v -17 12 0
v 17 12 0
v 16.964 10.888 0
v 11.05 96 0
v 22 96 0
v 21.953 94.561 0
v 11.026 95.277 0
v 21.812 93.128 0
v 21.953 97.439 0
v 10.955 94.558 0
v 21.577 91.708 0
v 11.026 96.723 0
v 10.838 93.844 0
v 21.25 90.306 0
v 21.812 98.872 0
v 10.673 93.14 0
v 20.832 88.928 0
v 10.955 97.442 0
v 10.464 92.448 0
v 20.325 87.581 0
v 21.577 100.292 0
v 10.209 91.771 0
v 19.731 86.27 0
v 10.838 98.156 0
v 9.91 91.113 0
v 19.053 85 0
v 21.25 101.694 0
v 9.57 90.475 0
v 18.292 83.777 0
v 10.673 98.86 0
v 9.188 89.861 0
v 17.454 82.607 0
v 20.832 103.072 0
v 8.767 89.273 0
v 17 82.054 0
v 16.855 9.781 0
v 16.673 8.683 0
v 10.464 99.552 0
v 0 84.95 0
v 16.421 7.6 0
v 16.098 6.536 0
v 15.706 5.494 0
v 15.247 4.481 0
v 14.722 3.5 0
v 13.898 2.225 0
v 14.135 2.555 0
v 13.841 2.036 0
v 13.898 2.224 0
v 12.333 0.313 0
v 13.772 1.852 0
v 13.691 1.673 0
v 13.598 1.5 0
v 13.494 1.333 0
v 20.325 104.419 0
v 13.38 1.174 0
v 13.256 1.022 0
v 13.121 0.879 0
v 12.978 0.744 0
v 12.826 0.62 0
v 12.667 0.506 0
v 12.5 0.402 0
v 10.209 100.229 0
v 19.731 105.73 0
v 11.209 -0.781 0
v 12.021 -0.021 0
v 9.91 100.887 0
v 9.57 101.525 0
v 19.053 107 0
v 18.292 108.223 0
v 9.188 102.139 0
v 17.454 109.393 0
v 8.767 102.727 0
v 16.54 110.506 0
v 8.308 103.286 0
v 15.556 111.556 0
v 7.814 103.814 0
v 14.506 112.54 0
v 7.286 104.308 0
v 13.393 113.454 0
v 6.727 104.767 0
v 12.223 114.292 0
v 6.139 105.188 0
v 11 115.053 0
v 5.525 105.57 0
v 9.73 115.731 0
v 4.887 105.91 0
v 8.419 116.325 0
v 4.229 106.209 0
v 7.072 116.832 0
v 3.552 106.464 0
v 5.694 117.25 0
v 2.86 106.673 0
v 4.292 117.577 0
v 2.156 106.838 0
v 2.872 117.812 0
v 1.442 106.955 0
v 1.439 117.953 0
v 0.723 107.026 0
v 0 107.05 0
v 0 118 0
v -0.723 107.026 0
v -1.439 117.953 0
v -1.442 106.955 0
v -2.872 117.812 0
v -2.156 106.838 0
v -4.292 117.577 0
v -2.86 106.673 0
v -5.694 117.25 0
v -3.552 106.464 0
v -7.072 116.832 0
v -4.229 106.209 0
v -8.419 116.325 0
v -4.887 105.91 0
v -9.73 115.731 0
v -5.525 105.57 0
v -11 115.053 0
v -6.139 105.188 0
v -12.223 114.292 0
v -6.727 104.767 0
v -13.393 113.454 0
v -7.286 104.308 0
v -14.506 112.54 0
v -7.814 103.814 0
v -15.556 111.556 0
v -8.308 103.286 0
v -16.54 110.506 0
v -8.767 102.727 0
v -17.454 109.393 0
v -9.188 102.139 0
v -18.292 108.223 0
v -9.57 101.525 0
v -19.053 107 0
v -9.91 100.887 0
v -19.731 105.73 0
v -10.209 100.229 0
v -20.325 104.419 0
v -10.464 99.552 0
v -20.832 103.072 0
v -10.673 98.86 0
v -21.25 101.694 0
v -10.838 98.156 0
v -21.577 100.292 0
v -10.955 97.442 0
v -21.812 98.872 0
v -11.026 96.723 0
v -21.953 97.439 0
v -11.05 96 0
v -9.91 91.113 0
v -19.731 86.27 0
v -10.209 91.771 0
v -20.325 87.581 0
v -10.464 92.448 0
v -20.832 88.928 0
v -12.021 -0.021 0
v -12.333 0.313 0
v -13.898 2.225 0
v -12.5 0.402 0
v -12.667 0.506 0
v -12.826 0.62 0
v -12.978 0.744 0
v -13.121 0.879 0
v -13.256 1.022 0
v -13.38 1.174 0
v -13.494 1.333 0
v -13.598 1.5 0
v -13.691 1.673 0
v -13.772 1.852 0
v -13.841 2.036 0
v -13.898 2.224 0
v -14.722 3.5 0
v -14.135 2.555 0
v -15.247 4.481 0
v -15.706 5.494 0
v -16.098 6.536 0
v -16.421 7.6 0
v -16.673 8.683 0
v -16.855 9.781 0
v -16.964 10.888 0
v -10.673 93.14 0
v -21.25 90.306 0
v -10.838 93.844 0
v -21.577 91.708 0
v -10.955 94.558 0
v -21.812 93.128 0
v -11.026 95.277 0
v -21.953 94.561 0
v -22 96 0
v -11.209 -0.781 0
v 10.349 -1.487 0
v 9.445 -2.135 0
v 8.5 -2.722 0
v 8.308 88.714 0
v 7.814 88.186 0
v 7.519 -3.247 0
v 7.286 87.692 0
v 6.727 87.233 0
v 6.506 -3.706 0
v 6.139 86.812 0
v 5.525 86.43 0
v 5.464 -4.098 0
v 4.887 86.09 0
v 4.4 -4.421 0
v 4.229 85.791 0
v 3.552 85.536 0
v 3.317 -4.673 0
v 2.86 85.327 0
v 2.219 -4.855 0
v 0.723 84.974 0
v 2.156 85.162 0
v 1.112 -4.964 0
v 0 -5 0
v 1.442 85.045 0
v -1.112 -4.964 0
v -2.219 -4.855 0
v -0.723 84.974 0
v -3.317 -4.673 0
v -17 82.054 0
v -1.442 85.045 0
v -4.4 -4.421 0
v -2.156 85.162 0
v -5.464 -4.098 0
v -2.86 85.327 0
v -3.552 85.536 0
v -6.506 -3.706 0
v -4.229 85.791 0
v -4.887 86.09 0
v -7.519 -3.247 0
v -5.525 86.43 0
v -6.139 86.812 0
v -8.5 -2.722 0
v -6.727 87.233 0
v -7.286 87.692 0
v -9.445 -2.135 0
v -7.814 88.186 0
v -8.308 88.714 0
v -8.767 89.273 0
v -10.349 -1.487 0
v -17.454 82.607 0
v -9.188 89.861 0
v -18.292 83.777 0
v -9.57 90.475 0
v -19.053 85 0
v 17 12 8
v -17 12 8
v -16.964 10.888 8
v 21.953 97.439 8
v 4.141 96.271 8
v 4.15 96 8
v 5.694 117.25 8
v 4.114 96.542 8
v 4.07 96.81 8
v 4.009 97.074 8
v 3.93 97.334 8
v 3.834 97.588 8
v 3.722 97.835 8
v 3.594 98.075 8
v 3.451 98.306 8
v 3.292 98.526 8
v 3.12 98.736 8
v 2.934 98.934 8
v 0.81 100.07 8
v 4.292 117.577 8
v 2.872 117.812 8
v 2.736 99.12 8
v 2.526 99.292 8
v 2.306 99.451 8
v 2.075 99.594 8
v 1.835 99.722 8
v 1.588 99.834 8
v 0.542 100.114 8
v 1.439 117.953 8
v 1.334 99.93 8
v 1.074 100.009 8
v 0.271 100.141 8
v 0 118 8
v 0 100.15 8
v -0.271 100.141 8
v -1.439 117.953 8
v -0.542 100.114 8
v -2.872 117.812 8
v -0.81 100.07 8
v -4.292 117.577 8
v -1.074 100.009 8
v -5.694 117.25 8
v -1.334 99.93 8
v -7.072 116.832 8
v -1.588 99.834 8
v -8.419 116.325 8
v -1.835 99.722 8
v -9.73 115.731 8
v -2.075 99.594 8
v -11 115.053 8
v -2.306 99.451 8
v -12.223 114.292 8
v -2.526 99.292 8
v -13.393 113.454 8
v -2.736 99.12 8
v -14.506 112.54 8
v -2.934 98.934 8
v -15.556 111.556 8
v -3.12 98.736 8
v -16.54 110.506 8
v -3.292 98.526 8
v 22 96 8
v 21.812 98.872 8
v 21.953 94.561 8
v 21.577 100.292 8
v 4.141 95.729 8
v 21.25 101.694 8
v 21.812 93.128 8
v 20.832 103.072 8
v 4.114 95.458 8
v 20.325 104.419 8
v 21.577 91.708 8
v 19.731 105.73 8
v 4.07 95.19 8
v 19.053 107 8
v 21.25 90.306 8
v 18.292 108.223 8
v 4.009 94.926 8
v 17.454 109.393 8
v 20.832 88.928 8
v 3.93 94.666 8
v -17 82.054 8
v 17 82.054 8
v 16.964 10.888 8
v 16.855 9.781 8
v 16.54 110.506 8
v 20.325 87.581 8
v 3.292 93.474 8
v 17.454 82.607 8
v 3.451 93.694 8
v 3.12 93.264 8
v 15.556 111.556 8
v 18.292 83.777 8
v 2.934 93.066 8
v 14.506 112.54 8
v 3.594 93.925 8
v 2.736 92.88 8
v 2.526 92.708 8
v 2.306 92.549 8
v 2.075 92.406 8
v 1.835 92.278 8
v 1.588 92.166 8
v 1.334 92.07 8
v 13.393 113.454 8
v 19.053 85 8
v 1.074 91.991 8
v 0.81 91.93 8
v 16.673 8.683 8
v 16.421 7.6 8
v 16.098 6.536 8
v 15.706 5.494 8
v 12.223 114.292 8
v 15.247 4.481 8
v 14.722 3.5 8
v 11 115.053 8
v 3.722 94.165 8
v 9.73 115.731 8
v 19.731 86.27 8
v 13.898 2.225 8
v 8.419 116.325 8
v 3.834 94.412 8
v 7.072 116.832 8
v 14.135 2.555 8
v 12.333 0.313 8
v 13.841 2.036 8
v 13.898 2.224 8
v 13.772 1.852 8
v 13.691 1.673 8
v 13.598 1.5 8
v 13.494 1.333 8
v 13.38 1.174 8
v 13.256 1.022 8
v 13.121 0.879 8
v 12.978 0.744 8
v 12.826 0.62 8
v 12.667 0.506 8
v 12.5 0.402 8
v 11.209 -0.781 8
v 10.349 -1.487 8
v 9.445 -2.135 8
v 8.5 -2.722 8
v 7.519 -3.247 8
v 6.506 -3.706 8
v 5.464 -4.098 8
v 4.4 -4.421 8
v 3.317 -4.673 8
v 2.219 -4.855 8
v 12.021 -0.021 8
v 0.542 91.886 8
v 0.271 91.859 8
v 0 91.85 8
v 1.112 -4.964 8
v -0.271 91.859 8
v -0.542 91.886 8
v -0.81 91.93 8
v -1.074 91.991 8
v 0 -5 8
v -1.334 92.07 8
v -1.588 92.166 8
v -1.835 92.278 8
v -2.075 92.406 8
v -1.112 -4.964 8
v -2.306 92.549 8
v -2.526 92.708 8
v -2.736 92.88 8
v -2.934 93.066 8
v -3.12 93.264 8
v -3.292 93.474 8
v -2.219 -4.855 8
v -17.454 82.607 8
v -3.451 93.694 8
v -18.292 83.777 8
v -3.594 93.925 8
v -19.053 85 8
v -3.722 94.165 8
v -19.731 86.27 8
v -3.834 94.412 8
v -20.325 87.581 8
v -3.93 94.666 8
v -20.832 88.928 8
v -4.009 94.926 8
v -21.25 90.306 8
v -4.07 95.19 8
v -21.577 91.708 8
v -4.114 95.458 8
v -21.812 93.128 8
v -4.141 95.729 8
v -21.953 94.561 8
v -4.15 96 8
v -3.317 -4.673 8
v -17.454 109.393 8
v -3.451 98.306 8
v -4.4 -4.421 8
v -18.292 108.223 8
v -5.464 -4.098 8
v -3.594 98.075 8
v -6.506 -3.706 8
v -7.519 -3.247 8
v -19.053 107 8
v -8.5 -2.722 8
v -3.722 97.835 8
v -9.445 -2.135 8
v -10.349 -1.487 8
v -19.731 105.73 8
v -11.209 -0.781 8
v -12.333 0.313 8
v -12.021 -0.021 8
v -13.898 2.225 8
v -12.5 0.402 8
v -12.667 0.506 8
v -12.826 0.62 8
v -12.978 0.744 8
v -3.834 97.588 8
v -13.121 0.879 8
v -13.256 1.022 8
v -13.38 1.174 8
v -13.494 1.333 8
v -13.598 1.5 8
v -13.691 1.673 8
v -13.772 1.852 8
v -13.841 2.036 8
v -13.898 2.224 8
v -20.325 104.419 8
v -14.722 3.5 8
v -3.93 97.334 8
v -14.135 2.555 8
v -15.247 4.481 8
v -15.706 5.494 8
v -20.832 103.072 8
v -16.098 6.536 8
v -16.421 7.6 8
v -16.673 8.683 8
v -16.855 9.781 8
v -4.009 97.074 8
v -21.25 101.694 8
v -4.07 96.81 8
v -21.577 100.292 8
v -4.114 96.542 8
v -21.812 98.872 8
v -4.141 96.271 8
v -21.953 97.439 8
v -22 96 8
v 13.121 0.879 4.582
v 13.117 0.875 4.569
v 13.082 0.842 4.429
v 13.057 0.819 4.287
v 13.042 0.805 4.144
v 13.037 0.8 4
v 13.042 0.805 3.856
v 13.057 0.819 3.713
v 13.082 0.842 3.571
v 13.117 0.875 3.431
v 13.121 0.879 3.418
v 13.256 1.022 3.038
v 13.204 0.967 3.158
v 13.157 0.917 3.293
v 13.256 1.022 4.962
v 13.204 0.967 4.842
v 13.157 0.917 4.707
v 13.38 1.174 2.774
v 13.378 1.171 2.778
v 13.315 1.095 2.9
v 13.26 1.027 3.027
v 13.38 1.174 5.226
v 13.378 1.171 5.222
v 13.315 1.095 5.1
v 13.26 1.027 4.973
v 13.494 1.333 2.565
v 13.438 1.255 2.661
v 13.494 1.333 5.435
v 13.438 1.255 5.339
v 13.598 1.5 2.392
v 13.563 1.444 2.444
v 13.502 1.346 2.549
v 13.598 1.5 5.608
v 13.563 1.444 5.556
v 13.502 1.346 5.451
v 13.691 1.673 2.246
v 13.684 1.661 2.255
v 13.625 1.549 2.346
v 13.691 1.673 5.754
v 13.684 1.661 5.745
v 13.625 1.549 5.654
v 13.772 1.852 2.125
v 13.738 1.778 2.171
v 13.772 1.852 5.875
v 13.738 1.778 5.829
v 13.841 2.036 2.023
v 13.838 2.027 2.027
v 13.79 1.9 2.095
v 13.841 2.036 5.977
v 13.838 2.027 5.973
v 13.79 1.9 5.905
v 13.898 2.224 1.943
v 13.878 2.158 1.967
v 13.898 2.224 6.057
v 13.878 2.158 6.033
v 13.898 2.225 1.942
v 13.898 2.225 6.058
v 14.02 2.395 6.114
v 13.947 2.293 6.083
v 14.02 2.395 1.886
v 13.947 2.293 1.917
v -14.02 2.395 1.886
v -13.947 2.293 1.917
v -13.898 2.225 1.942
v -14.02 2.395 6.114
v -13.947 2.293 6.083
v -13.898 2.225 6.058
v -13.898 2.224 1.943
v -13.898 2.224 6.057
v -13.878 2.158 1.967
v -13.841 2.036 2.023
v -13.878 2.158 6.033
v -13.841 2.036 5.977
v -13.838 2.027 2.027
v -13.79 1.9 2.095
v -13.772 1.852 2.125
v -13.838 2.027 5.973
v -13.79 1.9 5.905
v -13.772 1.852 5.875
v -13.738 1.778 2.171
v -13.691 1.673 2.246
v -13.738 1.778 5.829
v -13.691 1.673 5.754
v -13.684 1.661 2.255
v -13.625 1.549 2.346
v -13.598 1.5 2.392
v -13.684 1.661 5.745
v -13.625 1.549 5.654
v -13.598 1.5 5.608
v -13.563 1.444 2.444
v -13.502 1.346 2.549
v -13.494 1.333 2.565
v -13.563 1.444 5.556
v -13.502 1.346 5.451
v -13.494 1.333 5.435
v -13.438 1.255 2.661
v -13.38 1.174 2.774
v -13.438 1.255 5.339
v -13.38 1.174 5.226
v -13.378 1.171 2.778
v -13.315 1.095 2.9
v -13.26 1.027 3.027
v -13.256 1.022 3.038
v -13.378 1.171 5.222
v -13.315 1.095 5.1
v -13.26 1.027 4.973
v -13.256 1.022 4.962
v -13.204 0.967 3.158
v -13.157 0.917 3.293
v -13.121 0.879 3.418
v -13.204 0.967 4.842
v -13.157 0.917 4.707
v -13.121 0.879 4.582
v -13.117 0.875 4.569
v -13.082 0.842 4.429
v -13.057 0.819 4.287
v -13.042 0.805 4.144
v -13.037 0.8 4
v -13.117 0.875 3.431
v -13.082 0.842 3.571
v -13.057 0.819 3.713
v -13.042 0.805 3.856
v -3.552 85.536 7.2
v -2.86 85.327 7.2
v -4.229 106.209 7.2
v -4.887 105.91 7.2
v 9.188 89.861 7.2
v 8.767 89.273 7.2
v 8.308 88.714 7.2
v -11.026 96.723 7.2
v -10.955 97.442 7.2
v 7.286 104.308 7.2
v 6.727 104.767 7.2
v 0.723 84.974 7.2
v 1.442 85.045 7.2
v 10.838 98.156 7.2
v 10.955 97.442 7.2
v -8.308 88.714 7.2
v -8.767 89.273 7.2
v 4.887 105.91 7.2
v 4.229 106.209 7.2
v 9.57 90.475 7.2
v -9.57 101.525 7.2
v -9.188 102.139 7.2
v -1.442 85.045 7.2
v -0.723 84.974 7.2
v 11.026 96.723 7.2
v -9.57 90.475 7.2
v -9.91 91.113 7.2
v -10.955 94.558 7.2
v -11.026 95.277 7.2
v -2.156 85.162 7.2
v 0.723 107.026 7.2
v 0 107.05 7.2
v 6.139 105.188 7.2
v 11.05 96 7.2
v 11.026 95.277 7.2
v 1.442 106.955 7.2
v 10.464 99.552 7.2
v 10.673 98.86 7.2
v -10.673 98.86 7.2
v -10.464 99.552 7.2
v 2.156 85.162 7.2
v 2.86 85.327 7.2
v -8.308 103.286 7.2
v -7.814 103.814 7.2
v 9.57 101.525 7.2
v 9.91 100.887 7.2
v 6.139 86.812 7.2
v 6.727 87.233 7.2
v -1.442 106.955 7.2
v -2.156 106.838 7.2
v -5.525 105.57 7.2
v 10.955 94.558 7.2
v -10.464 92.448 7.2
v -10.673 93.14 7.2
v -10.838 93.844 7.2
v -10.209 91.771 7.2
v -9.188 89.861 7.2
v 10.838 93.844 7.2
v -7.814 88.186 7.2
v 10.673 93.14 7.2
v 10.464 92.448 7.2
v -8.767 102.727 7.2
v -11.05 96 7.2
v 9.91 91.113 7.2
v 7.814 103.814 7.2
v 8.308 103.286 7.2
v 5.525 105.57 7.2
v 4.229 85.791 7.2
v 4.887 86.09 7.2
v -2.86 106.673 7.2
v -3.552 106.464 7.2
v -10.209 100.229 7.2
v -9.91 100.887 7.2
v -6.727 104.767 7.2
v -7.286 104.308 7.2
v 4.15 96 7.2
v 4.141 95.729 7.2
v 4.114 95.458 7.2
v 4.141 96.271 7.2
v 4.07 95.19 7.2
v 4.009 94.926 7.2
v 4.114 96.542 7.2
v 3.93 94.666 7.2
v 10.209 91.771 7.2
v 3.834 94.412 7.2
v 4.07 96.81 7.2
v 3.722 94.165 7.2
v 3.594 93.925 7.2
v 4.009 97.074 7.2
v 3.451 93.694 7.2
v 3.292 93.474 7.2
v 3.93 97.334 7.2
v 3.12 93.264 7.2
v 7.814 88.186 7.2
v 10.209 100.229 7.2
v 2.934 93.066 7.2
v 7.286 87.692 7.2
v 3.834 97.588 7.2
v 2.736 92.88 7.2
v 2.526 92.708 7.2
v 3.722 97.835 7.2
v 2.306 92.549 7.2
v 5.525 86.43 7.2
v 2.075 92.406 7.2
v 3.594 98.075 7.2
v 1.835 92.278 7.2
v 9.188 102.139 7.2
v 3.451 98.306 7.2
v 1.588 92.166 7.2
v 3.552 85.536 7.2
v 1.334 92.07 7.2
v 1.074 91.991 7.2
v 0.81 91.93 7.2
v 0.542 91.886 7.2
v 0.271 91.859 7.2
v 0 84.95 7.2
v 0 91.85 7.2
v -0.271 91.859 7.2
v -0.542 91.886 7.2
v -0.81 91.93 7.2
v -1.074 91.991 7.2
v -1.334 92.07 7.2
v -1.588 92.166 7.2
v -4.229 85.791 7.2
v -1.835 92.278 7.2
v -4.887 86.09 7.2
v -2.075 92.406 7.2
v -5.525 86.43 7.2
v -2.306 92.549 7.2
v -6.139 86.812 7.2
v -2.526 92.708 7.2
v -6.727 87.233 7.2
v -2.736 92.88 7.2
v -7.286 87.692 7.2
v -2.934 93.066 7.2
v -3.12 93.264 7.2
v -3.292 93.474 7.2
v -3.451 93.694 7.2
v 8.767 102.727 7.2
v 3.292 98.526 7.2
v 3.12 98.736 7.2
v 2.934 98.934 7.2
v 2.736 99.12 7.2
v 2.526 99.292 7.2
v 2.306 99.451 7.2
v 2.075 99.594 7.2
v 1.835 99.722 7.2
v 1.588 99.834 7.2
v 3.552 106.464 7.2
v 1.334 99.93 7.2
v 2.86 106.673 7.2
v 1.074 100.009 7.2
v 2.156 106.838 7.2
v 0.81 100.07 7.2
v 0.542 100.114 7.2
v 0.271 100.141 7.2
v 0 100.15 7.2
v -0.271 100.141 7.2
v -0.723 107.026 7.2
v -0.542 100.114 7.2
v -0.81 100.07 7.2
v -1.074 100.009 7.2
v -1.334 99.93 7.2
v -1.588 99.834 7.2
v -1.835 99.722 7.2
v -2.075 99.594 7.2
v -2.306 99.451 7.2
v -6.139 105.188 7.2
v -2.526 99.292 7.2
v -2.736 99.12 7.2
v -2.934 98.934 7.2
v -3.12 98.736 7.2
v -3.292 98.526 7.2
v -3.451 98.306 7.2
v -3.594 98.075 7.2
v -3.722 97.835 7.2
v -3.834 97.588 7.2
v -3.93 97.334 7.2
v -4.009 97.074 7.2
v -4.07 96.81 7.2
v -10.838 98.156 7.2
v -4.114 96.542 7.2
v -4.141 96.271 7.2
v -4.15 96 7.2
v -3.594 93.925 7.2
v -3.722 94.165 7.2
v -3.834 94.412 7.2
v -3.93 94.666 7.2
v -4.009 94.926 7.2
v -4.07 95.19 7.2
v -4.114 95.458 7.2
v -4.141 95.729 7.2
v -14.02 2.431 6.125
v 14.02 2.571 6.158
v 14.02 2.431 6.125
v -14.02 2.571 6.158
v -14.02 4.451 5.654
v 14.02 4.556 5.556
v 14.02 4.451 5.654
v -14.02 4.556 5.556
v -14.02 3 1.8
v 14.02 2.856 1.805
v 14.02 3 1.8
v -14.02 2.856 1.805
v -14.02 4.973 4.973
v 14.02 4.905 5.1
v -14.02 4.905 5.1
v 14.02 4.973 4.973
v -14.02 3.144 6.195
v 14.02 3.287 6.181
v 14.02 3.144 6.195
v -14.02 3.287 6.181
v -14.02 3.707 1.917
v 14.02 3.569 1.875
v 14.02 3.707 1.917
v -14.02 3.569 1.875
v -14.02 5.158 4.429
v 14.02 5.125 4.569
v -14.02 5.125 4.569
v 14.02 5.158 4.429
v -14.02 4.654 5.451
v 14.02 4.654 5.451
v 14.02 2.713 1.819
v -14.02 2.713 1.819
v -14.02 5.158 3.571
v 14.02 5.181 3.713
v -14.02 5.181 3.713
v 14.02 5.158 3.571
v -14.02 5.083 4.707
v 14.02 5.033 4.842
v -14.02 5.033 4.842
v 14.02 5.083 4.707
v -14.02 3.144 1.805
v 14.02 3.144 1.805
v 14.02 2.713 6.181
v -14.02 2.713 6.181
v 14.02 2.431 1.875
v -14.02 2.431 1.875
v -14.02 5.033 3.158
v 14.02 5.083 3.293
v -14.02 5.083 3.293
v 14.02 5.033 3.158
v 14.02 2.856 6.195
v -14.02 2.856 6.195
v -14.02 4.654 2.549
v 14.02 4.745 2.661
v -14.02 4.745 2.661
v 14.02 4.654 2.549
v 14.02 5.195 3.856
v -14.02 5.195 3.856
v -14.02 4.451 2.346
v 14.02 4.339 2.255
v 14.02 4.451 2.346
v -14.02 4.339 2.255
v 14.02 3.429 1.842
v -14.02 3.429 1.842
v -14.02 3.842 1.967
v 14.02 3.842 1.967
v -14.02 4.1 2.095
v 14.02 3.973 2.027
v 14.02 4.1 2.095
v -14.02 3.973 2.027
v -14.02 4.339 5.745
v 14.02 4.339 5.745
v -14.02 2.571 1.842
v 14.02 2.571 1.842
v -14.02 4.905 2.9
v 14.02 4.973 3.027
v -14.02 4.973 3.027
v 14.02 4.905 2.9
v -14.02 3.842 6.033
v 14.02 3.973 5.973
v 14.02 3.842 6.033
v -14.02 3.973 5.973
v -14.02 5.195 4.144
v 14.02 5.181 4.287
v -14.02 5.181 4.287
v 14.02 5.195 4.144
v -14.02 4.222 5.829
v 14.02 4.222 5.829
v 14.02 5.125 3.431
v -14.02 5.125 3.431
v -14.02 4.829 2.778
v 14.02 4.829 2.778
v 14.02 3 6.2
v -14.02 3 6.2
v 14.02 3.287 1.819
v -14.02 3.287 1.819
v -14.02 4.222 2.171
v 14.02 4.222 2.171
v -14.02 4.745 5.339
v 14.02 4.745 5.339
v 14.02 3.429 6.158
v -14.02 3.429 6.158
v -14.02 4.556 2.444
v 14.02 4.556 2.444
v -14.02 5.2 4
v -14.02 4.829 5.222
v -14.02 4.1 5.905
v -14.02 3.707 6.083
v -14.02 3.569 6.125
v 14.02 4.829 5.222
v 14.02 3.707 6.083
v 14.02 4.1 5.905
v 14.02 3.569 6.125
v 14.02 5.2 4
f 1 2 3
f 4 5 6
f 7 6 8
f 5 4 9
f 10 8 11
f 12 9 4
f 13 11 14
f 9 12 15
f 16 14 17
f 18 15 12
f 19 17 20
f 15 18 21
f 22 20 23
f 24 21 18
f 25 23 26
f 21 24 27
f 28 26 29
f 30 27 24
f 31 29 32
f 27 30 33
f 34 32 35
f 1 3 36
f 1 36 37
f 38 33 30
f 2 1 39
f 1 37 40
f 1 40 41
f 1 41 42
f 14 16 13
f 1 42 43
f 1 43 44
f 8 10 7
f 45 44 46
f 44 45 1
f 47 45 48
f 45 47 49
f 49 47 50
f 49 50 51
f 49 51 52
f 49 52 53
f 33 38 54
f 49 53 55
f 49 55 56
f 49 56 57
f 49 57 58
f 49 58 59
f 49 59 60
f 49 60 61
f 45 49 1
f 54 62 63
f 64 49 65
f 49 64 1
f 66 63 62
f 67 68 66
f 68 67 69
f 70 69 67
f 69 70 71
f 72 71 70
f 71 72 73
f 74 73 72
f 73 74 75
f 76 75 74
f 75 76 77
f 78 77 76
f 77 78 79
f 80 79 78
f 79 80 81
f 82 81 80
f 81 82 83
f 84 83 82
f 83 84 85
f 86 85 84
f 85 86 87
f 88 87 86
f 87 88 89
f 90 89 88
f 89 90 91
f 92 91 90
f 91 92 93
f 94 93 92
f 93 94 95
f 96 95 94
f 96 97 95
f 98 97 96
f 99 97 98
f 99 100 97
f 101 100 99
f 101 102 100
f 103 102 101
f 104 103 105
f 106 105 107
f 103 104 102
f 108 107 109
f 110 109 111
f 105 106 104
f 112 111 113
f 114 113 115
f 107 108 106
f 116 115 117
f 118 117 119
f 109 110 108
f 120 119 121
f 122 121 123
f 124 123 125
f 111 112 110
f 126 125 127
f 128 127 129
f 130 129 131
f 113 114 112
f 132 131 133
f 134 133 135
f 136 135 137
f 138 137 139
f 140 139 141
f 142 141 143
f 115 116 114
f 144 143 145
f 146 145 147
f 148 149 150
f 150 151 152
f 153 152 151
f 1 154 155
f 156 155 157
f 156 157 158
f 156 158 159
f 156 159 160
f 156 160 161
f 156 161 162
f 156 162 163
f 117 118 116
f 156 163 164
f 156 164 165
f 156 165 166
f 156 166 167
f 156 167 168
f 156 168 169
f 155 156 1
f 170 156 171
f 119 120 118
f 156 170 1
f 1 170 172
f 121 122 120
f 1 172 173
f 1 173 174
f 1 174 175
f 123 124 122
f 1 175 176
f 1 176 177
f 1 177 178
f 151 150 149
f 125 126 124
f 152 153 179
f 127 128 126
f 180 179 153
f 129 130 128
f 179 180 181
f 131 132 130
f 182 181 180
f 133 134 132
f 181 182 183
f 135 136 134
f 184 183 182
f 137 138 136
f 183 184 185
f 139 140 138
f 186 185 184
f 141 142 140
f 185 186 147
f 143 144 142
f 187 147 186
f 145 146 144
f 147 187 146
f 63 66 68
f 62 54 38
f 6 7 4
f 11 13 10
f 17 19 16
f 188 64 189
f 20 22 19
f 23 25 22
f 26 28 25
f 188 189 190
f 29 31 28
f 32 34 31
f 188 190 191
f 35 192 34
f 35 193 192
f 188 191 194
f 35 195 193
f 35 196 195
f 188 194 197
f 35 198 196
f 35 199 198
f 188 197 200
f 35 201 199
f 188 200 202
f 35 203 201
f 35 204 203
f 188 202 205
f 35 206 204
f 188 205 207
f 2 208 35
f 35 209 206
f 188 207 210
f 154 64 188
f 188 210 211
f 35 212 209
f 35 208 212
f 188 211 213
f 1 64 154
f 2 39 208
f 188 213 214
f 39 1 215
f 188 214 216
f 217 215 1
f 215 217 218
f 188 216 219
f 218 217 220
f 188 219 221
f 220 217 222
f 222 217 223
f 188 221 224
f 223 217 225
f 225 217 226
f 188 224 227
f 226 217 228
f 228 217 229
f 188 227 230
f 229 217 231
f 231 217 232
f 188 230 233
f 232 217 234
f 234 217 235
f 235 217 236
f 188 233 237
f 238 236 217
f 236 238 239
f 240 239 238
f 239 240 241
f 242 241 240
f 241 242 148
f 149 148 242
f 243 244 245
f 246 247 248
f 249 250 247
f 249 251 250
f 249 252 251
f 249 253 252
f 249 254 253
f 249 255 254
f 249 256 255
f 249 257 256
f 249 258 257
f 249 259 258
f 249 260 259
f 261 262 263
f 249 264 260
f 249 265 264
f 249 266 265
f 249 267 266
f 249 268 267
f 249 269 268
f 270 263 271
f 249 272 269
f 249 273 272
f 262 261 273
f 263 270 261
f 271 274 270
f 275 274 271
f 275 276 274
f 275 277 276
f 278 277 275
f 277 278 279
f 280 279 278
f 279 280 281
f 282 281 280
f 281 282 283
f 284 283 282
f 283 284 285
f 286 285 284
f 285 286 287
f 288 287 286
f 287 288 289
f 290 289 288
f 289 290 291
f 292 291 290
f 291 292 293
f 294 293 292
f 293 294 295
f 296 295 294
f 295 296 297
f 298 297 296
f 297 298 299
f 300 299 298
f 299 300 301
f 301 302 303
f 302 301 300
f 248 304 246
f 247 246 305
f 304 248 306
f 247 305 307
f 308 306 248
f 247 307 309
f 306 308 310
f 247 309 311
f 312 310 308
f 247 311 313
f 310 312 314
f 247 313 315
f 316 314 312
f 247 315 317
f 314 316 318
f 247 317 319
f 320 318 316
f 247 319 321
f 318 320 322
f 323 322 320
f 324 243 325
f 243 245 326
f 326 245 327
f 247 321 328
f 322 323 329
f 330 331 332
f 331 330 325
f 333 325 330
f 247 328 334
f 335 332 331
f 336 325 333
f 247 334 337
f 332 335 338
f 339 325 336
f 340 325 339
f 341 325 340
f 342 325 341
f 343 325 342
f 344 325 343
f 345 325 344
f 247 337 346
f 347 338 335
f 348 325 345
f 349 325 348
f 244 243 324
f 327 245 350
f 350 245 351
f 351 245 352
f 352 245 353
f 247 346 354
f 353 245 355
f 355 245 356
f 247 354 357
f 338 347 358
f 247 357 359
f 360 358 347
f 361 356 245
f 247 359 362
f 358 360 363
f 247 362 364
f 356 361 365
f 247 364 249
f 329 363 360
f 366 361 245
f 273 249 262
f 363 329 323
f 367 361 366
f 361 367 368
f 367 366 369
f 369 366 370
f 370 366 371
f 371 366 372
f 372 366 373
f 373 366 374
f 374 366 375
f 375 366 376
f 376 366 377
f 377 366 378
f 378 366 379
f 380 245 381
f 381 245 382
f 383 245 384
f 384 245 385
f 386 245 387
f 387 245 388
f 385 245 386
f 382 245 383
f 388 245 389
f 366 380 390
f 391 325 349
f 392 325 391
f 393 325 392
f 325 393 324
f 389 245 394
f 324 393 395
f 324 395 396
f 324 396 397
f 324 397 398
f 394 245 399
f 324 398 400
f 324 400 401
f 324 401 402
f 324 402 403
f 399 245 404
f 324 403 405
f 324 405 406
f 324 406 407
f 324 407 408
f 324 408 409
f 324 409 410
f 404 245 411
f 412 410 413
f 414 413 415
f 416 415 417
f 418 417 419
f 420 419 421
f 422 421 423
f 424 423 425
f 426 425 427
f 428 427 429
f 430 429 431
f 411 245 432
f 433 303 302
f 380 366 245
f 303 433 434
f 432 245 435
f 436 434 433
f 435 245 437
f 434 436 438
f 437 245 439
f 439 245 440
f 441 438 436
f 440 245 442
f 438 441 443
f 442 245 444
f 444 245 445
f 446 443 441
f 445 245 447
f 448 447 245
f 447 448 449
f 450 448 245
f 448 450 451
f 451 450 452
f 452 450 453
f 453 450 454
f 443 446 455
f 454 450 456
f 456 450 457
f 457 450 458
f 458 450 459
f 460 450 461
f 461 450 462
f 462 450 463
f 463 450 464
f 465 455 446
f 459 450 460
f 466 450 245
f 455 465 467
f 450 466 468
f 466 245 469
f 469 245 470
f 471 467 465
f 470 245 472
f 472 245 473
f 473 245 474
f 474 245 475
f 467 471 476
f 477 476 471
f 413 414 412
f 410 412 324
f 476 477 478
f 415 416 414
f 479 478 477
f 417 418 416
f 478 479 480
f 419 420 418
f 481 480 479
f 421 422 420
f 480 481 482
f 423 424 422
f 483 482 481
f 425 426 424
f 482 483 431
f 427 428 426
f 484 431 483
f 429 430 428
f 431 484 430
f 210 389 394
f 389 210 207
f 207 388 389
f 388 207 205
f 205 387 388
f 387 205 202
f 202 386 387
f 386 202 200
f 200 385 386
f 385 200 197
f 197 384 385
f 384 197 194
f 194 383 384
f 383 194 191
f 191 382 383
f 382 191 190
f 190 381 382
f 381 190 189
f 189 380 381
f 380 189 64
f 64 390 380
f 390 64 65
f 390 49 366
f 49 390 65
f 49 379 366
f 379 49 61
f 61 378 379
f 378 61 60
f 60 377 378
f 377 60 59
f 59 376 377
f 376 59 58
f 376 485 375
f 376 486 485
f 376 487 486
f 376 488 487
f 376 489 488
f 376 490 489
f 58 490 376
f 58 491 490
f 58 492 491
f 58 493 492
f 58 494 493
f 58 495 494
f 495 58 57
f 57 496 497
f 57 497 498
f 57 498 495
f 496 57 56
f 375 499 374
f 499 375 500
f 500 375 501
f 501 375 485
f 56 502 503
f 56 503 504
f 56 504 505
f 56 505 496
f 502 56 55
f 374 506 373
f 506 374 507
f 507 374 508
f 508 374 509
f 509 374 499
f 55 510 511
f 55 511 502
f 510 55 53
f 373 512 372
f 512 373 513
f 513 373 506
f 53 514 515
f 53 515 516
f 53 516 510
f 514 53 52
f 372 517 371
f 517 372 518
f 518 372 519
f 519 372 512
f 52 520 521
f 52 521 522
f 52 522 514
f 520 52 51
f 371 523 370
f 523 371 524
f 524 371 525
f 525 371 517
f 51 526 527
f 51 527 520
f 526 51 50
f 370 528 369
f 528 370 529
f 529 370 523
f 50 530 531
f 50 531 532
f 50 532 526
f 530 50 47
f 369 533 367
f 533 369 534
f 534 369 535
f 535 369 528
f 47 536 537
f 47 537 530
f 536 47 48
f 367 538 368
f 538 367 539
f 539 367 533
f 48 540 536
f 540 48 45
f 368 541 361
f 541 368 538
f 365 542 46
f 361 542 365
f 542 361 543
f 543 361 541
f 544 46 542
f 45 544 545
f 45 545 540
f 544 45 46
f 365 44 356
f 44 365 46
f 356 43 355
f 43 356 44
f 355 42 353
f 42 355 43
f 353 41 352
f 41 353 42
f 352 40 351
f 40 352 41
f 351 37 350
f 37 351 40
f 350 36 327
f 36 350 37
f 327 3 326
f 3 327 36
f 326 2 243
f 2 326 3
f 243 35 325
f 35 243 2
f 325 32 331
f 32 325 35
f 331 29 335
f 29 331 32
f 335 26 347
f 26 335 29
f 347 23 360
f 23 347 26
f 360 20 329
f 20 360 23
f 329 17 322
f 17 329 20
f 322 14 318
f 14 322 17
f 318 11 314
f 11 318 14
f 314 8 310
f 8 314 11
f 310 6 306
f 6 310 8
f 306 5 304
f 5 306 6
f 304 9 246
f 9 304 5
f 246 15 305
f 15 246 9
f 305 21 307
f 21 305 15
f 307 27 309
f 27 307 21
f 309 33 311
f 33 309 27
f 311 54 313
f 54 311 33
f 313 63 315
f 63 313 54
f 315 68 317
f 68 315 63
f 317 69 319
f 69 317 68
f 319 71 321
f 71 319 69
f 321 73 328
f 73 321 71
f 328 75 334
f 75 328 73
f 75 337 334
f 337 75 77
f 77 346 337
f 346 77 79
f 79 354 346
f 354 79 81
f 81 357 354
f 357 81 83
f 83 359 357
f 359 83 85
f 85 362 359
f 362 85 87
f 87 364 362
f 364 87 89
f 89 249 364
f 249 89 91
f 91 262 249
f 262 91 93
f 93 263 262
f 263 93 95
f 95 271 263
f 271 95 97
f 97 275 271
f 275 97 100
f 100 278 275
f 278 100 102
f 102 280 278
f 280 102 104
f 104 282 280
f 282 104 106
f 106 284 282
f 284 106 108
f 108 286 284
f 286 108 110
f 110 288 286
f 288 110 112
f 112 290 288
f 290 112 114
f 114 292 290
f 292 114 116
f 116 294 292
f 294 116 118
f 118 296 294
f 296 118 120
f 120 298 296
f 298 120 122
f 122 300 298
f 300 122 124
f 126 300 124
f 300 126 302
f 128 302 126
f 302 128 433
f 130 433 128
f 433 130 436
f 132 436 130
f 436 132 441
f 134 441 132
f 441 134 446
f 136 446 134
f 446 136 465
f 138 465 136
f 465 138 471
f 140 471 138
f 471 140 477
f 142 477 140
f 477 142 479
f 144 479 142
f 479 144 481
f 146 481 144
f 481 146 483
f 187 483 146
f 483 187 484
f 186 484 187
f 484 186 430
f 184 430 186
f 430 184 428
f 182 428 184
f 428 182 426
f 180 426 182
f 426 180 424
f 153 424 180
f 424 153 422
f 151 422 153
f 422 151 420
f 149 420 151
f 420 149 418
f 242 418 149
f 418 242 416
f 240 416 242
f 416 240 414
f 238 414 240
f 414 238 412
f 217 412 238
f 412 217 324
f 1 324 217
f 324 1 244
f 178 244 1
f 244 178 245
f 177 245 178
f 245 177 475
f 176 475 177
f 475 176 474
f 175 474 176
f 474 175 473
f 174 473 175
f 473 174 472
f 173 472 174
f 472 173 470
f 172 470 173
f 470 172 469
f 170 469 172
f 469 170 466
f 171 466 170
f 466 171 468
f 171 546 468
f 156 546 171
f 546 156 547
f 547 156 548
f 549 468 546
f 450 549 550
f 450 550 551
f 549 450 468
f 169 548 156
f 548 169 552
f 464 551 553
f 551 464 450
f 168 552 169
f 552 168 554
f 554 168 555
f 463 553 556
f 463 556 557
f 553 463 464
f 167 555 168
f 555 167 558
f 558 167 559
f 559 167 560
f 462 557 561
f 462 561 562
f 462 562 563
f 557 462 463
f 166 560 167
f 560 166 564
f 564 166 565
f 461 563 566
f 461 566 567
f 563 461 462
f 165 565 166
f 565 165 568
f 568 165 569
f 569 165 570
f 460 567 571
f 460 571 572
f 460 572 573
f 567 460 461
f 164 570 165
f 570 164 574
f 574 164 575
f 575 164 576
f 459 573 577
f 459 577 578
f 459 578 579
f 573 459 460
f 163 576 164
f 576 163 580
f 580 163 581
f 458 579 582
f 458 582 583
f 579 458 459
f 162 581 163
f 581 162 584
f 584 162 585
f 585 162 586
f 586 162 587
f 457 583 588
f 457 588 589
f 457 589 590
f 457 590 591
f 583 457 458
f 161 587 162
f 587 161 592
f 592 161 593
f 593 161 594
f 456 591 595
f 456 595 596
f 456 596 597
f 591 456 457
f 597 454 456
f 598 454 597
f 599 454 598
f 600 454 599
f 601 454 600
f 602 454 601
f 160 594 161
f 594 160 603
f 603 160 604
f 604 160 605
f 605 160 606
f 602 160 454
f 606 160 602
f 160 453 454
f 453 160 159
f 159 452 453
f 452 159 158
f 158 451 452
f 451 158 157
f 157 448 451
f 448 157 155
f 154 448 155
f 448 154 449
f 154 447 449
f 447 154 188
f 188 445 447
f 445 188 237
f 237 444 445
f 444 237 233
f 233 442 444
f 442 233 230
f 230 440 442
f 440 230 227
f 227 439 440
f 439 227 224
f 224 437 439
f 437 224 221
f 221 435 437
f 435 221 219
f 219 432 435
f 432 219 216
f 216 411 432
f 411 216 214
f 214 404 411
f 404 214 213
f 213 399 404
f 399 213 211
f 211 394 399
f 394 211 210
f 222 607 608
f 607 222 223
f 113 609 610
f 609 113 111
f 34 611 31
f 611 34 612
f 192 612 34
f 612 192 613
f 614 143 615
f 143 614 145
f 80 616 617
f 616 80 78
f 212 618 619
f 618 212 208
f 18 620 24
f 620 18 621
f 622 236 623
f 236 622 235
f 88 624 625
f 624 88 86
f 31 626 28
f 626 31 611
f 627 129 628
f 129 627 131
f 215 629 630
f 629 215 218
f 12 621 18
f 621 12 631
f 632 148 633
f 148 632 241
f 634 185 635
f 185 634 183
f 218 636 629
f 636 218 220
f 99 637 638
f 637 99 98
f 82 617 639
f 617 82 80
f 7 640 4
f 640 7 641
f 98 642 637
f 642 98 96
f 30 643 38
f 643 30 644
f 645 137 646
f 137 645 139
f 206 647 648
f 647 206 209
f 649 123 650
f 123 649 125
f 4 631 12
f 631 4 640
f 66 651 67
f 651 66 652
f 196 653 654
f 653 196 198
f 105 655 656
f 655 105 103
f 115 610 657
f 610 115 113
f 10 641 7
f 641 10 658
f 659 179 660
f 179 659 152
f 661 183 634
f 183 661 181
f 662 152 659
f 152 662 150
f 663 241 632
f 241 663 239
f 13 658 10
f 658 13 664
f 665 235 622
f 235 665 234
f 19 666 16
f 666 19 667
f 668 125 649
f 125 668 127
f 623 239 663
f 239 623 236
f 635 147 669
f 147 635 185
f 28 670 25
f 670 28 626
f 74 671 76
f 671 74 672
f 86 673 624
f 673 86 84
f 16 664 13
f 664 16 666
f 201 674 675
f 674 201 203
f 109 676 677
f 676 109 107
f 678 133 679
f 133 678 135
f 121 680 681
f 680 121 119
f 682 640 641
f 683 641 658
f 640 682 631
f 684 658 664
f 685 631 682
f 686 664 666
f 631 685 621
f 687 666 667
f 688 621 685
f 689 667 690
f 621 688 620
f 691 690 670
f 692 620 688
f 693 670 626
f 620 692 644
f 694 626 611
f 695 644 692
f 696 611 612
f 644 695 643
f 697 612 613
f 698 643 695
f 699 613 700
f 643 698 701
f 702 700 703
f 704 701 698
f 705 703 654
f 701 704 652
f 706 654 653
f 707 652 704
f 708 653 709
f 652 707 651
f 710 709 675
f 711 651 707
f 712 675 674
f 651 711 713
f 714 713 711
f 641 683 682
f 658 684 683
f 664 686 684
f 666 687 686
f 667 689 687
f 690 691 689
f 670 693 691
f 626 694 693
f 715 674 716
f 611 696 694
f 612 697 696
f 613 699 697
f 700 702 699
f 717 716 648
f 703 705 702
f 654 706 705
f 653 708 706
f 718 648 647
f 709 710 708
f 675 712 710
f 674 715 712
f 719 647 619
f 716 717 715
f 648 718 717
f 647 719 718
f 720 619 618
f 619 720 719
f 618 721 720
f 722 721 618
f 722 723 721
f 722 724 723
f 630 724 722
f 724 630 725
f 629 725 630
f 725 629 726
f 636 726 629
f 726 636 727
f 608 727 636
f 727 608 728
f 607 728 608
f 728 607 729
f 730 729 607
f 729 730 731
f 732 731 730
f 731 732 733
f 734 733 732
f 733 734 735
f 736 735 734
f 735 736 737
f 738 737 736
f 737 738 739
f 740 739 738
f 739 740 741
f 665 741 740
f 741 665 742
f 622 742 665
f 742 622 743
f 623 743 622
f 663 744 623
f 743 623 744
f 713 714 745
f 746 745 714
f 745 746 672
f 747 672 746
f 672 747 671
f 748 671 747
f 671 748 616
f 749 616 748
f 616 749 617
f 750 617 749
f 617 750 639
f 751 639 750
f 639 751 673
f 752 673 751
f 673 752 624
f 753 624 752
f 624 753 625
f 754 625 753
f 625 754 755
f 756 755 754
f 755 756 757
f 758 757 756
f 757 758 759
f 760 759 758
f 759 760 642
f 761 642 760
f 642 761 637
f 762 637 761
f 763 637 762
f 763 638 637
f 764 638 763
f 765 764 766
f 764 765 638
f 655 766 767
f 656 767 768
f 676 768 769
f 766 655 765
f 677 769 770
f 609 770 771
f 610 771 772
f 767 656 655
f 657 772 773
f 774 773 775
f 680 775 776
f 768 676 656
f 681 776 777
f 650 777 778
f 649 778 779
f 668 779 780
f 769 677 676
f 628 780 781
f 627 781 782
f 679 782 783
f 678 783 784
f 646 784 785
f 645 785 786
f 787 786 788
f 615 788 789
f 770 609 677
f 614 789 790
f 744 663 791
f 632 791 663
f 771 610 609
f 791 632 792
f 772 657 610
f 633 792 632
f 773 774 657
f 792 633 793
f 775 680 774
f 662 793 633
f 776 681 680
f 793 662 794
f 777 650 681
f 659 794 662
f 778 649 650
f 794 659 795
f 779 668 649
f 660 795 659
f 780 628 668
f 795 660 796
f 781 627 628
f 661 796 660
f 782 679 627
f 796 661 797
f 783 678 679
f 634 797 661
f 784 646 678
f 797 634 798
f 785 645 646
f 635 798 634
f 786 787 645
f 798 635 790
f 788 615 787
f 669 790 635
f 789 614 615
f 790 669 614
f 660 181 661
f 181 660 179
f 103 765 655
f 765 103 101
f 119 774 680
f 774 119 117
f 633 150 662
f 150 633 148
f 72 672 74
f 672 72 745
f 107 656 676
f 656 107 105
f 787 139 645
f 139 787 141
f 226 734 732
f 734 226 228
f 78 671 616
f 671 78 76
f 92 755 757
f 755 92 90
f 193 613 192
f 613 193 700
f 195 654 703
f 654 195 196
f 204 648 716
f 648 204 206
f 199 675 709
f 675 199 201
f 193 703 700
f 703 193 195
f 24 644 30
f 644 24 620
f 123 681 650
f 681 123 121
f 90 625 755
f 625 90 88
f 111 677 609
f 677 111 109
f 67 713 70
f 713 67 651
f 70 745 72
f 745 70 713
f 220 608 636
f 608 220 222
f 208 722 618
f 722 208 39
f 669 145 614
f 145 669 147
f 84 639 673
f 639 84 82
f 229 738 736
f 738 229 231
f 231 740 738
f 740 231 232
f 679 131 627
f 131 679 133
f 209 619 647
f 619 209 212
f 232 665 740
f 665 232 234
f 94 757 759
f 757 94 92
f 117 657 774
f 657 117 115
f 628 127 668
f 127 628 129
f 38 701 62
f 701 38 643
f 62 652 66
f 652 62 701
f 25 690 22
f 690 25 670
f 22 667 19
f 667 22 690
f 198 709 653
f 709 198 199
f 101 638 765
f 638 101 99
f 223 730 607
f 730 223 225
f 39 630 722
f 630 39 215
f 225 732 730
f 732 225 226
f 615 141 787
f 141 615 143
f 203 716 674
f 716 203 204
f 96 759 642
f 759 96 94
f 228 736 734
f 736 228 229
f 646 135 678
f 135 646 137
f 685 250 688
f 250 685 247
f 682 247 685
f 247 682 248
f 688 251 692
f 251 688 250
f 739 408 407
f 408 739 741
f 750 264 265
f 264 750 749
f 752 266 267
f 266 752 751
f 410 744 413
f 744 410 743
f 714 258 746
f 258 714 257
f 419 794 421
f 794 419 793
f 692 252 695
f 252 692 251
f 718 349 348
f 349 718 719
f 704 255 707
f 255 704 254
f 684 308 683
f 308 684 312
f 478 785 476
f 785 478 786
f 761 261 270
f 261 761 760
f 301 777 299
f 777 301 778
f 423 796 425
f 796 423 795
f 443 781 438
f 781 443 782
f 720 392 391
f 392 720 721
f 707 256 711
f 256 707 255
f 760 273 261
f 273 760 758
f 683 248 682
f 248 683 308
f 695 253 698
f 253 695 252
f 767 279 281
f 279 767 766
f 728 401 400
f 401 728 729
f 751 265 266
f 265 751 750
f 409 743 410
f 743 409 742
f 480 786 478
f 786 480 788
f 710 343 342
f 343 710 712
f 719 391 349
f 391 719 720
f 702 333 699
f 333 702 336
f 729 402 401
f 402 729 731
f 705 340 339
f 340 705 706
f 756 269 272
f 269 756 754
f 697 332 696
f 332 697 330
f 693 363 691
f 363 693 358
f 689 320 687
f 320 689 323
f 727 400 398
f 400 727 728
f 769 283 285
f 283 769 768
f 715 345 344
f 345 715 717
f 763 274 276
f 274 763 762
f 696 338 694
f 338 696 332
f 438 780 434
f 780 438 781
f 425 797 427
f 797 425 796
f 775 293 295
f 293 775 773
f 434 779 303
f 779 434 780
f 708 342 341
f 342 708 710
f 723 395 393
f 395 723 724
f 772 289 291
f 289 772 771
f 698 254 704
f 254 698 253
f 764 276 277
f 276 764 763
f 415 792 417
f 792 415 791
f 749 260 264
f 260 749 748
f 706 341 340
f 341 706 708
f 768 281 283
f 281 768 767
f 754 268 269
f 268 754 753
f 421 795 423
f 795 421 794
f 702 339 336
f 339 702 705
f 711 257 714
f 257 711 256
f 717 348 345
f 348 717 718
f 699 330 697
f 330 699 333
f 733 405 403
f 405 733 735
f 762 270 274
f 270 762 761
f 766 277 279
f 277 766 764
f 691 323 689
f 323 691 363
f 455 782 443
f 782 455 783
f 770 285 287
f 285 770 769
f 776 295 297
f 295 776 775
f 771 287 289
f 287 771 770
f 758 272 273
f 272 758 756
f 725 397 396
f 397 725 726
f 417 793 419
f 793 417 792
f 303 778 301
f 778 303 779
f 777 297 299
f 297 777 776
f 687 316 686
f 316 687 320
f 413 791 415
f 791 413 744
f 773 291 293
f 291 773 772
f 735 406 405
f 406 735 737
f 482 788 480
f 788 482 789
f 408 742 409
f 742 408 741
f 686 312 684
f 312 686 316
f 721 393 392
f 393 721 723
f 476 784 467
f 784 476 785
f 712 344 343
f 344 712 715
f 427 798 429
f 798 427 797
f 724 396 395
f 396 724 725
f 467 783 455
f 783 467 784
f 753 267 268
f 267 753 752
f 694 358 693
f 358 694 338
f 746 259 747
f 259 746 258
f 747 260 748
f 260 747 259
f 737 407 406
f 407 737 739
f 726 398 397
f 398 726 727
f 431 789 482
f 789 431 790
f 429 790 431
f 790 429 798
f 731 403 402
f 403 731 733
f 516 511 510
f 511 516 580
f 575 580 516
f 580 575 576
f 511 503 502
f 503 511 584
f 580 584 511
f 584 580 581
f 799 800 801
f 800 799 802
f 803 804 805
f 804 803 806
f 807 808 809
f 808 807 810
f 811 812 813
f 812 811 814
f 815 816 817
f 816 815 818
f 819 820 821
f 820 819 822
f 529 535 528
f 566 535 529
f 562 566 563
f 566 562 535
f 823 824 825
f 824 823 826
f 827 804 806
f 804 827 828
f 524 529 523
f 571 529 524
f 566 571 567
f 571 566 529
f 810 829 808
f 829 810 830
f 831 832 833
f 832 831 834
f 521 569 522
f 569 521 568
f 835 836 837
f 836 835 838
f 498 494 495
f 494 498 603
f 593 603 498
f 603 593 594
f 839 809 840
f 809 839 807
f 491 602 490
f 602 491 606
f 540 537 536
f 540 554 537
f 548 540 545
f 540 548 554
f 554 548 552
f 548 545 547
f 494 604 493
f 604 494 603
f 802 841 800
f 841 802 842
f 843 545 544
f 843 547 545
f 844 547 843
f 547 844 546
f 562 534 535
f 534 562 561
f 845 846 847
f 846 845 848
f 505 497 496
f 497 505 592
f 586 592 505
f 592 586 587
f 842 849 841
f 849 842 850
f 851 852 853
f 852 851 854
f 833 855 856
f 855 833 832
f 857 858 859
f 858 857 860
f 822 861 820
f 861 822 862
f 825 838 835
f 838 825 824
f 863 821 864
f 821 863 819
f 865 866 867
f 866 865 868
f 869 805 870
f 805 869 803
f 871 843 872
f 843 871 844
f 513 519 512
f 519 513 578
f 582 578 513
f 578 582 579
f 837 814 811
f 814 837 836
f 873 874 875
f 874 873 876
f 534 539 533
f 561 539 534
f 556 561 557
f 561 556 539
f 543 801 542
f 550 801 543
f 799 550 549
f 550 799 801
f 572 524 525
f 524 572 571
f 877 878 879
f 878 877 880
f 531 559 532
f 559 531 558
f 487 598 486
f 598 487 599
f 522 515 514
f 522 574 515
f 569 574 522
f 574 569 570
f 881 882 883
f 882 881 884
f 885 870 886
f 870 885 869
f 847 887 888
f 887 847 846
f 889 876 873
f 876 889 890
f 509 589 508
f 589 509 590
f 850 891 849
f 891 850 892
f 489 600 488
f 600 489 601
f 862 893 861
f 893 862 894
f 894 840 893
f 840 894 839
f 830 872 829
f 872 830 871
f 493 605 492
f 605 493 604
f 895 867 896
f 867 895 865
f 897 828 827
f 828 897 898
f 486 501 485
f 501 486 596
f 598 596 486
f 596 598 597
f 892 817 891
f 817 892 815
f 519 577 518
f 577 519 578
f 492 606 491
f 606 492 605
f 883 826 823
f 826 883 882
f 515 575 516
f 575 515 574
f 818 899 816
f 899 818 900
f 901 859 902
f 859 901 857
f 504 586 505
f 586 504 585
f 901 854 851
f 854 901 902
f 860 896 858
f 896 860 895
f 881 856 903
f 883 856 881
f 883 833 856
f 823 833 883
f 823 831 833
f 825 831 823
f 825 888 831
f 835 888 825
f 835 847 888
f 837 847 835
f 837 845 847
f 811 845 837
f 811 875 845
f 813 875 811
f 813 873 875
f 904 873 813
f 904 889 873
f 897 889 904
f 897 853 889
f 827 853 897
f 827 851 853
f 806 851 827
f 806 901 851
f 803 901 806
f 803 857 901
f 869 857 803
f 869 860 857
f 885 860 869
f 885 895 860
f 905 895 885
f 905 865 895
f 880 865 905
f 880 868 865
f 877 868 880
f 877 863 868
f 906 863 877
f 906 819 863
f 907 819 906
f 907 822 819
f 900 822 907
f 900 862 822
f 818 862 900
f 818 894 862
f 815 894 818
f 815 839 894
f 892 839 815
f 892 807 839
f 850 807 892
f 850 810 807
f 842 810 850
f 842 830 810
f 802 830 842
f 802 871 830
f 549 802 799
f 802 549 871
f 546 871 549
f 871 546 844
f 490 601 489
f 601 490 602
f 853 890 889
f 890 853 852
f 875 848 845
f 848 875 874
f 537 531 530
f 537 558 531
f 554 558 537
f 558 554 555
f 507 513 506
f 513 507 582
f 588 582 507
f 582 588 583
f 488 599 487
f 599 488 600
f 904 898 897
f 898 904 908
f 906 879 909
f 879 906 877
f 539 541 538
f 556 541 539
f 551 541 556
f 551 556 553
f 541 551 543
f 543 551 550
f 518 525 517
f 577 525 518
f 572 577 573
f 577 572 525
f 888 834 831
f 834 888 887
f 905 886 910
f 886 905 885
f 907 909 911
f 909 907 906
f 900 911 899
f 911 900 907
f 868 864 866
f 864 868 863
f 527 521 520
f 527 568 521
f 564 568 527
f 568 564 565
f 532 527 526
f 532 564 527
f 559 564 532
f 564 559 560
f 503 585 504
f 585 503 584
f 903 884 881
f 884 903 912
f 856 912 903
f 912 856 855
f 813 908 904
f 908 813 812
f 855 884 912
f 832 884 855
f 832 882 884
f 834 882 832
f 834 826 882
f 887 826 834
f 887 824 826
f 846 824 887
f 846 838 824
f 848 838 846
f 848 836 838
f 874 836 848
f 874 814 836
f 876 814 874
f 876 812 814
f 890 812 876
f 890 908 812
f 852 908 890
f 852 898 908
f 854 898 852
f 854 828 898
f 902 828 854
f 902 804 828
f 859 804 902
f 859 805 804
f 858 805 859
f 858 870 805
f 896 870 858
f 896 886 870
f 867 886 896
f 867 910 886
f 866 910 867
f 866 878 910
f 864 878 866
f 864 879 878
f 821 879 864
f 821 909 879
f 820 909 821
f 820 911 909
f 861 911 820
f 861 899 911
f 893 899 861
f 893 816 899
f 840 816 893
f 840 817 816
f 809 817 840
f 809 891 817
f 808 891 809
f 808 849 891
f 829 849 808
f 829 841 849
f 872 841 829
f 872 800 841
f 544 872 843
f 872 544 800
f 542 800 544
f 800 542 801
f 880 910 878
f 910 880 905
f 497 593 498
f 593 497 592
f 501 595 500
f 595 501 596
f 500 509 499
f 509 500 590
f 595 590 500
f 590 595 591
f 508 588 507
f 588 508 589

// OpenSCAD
// file: ../lib/util.scad
include <../config.scad>

function v2_add(a, b) = [a[0] + b[0], a[1] + b[1]];
function v2_sub(a, b) = [a[0] - b[0], a[1] - b[1]];
function v2_scale(a, s) = [a[0] * s, a[1] * s];
function rot2(p, a) = [p[0] * cos(a) - p[1] * sin(a), p[0] * sin(a) + p[1] * cos(a)];
function polar(r, a) = [r * cos(a), r * sin(a)];
function clamp(x, lo, hi) = min(max(x, lo), hi);

module rounded_rect_2d(size = [10, 10], r = 2, center = true) {
    sx = size[0]; sy = size[1]; rr = min(r, min(sx, sy) / 2);
    translate(center ? [0, 0] : [sx / 2, sy / 2])
        offset(r = rr) square([sx - 2 * rr, sy - 2 * rr], center = true);
}

module rounded_plate(size = [10, 10], r = 2, h = 2, center = false) {
    linear_extrude(height = h, center = center)
        rounded_rect_2d(size = size, r = r, center = true);
}

module slot_2d(length = 20, d = 4) {
    hull() {
        translate([-(length - d) / 2, 0]) circle(d = d);
        translate([(length - d) / 2, 0]) circle(d = d);
    }
}

module slot_3d(length = 20, d = 4, h = 5, center = false) {
    linear_extrude(height = h, center = center) slot_2d(length = length, d = d);
}

module hex_prism(af = 10, h = 5, center = false, rotation = 30) {
    rotate([0, 0, rotation]) cylinder(r = af / sqrt(3), h = h, center = center, $fn = 6);
}

module four_at_radius(r = 10, phase = 45) {
    for (a = [phase : 90 : phase + 270])
        rotate([0, 0, a]) translate([r, 0]) children();
}
// file: ../config.scad
// Global configuration for the printable 28BYJ-48 Alt-Az mount.
// Units: millimetres, degrees.

$fn = $preview ? 48 : 96;
EPS = 0.02;

FIT = 0.25;
PRESS_FIT = 0.10;
ELEPHANT_FOOT = 0.25;
MIN_WALL = 2.4;

// 28BYJ-48 mechanical envelope. Clone dimensions vary: verify yours.
BYJ_BODY_D = 28.0;
BYJ_BODY_H = 19.0;
BYJ_FLANGE_T = 1.5;
BYJ_BOSS_D = 9.0;
BYJ_BOSS_H = 2.5;
BYJ_SHAFT_D = 5.0;
BYJ_SHAFT_FLAT = 3.0;
BYJ_SHAFT_L = 10.0;
BYJ_MOUNT_SPACING = 35.0;
BYJ_MOUNT_HOLE_D = 4.0;
BYJ_SHAFT_TO_HOLE_LINE = 8.0;
BYJ_BODY_CENTER_FROM_SHAFT = [0, -11.0];
BYJ_CABLE_BOX = [14.6, 8.0, 11.0];

// Additional reducer: 12 -> 48 and 12 -> 60 = 20:1.
GEAR_MODULE = 1.0;
GEAR_PRESSURE_ANGLE = 20;
GEAR_BACKLASH = 0.12;
GEAR_CLEARANCE = 0.25;
GEAR_Z1 = 12;
GEAR_Z2 = 48;
GEAR_Z3 = 12;
GEAR_Z4 = 60;
GEAR_FACE = 5.0;
GEAR_GAP = 1.0;
GEAR_STACK_H = GEAR_FACE * 2 + GEAR_GAP;
GEAR_RATIO = (GEAR_Z2 / GEAR_Z1) * (GEAR_Z4 / GEAR_Z3);
CD_STAGE1 = GEAR_MODULE * (GEAR_Z1 + GEAR_Z2) / 2;
CD_STAGE2 = GEAR_MODULE * (GEAR_Z3 + GEAR_Z4) / 2;

REDUCER_OUTPUT = [0, 0];
REDUCER_INTERMEDIATE = [CD_STAGE2, 0];
REDUCER_MOTOR = [CD_STAGE2, CD_STAGE1];
REDUCER_MOTOR_ROT = 130;
INTERMEDIATE_AXLE_D = 3.2;

BEARING_608_ID = 8.0;
BEARING_608_OD = 22.0;
BEARING_608_W = 7.0;
AXIS_SHAFT_D = 8.0;
AXIS_CLEARANCE_D = 8.3;
M3_CLEARANCE_D = 3.3;
M4_CLEARANCE_D = 4.4;
M5_CLEARANCE_D = 5.5;
M8_CLEARANCE_D = 8.6;

TRIPOD_THREAD_D = 6.35;
TRIPOD_CLEARANCE_D = 6.8;
TRIPOD_NUT_AF = 11.2;
TRIPOD_NUT_H = 5.8;

// Azimuth base, gearbox cover and turntable.
AZ_BASE_D = 132.0;
AZ_COVER_BOLT_R = 59.0;
AZ_BASE_PLATE_H = 3.0;
AZ_PEDESTAL_H = 24.0;
AZ_PEDESTAL_D = 48.0;
AZ_COVER_H = 16.0;
AZ_COVER_WALL = 3.0;
AZ_COVER_TOP_T = 3.0;
AZ_TURNTABLE_D = 120.0;
AZ_TURNTABLE_H = 9.0;
AZ_GLIDE_RADIUS = 43.0;
AZ_GLIDE_D = 8.0;
AZ_GLIDE_GAP = 1.0;
AZ_COVER_CLEARANCE = 0.8;
AZ_OUTPUT_SPACER_H = 5.0;
AZ_OUTPUT_PASSAGE_D = 32.0;
AZ_OUTPUT_LOCATOR_D = 30.0;
AZ_OUTPUT_LOCATOR_DEPTH = 2.0;
AZ_OUTPUT_BOLT_R = 11.5;
AZ_AXIS_NUT_RECESS_D = 17.0;
AZ_AXIS_NUT_RECESS_H = 4.0;
AZ_YOKE_MOUNT_X = 36.0;
AZ_YOKE_MOUNT_Y = 10.0;
AZ_YOKE_NUT_DEPTH = 3.5;

// Azimuth 20:1 printed reducer axial stack and interfaces.
AZ_GEAR_Z0 = 1.0;
AZ_UPPER_GEAR_Z = AZ_GEAR_Z0 + GEAR_FACE + GEAR_GAP;
AZ_GEAR_TOP_CLEARANCE = AZ_COVER_H - AZ_COVER_TOP_T - (AZ_UPPER_GEAR_Z + GEAR_FACE);
AZ_MOTOR_PINION_HUB_D = 10.8;
AZ_MOTOR_PINION_HUB_H = 7.0;
AZ_COMPOUND_HUB_D = 10.0;
AZ_INTERMEDIATE_BORE_D = 3.35;
AZ_OUTPUT_HUB_D = 29.6;
AZ_OUTPUT_HUB_H = AZ_COVER_H + AZ_GLIDE_GAP + AZ_OUTPUT_LOCATOR_DEPTH - AZ_UPPER_GEAR_Z;
AZ_OUTPUT_NUT_DEPTH = 2.8;

YOKE_AXIS_Z = 96.0;
YOKE_INNER_W = 92.0;
YOKE_ARM_T = 8.0;
YOKE_ARM_W = 34.0;
YOKE_OUTER_W = YOKE_INNER_W + 2 * YOKE_ARM_T;
YOKE_FOOT_LEN = 42.0;
YOKE_FOOT_W = 30.0;
YOKE_ARM_CENTER_X = YOKE_INNER_W / 2 + YOKE_ARM_T / 2;
YOKE_TENON_LEN = 28.0;
YOKE_BRIDGE_X = 112.0;
YOKE_BRIDGE_Y = 36.0;
YOKE_BRIDGE_H = 12.0;
YOKE_SLOT_DEPTH = 9.0;
YOKE_SLOT_CLEARANCE = 0.35;
YOKE_LOCK_LOCAL_Y = 3.0;
YOKE_BEARING_POCKET_DEPTH = 7.2;
YOKE_DRIVE_BOSS_D = 54.0;
YOKE_IDLER_BOSS_D = 44.0;
YOKE_GEARBOX_BOLT_R = 18.0;
ALT_GEARBOX_GAP = 14.0;
ALT_BACKPLATE_H = 3.2;
ALT_SHAFT_L = YOKE_OUTER_W + ALT_GEARBOX_GAP + 28.0;

PAYLOAD_PLATE = [80.0, 112.0, 6.0];
PAYLOAD_SLOT_L = 48.0;
PAYLOAD_SLOT_D = TRIPOD_CLEARANCE_D;
SHAFT_CLAMP_W = 18.0;
SHAFT_CLAMP_L = 30.0;
SHAFT_CLAMP_H = 10.0;

BYJ_NOMINAL_HALFSTEPS_PER_OUTPUT_REV = 4096;
AXIS_NOMINAL_STEPS_PER_REV = BYJ_NOMINAL_HALFSTEPS_PER_OUTPUT_REV * GEAR_RATIO;
// main file
include <../config.scad>
use <../lib/util.scad>

module yoke_arm_profile_2d() {
    union() {
        translate([0, 9]) rounded_rect_2d(size = [YOKE_TENON_LEN, 18], r = 3);
        hull() {
            translate([0, 12]) circle(r = YOKE_ARM_W / 2);
            translate([0, YOKE_AXIS_Z]) circle(r = YOKE_ARM_W / 2);
        }
        translate([0, YOKE_AXIS_Z]) circle(d = YOKE_IDLER_BOSS_D);
    }
}

module yoke_arm_idler() {
    difference() {
        linear_extrude(height = YOKE_ARM_T) yoke_arm_profile_2d();

        translate([0, YOKE_AXIS_Z, -EPS])
            cylinder(d = BEARING_608_OD + PRESS_FIT,
                     h = YOKE_BEARING_POCKET_DEPTH + EPS);
        translate([0, YOKE_AXIS_Z, -EPS])
            cylinder(d = AXIS_CLEARANCE_D, h = YOKE_ARM_T + 2 * EPS);

        translate([0, YOKE_LOCK_LOCAL_Y, YOKE_ARM_T / 2])
            rotate([0, 90, 0])
                cylinder(d = M4_CLEARANCE_D,
                         h = YOKE_TENON_LEN + 2 * EPS, center = true);
    }
}

yoke_arm_idler();
